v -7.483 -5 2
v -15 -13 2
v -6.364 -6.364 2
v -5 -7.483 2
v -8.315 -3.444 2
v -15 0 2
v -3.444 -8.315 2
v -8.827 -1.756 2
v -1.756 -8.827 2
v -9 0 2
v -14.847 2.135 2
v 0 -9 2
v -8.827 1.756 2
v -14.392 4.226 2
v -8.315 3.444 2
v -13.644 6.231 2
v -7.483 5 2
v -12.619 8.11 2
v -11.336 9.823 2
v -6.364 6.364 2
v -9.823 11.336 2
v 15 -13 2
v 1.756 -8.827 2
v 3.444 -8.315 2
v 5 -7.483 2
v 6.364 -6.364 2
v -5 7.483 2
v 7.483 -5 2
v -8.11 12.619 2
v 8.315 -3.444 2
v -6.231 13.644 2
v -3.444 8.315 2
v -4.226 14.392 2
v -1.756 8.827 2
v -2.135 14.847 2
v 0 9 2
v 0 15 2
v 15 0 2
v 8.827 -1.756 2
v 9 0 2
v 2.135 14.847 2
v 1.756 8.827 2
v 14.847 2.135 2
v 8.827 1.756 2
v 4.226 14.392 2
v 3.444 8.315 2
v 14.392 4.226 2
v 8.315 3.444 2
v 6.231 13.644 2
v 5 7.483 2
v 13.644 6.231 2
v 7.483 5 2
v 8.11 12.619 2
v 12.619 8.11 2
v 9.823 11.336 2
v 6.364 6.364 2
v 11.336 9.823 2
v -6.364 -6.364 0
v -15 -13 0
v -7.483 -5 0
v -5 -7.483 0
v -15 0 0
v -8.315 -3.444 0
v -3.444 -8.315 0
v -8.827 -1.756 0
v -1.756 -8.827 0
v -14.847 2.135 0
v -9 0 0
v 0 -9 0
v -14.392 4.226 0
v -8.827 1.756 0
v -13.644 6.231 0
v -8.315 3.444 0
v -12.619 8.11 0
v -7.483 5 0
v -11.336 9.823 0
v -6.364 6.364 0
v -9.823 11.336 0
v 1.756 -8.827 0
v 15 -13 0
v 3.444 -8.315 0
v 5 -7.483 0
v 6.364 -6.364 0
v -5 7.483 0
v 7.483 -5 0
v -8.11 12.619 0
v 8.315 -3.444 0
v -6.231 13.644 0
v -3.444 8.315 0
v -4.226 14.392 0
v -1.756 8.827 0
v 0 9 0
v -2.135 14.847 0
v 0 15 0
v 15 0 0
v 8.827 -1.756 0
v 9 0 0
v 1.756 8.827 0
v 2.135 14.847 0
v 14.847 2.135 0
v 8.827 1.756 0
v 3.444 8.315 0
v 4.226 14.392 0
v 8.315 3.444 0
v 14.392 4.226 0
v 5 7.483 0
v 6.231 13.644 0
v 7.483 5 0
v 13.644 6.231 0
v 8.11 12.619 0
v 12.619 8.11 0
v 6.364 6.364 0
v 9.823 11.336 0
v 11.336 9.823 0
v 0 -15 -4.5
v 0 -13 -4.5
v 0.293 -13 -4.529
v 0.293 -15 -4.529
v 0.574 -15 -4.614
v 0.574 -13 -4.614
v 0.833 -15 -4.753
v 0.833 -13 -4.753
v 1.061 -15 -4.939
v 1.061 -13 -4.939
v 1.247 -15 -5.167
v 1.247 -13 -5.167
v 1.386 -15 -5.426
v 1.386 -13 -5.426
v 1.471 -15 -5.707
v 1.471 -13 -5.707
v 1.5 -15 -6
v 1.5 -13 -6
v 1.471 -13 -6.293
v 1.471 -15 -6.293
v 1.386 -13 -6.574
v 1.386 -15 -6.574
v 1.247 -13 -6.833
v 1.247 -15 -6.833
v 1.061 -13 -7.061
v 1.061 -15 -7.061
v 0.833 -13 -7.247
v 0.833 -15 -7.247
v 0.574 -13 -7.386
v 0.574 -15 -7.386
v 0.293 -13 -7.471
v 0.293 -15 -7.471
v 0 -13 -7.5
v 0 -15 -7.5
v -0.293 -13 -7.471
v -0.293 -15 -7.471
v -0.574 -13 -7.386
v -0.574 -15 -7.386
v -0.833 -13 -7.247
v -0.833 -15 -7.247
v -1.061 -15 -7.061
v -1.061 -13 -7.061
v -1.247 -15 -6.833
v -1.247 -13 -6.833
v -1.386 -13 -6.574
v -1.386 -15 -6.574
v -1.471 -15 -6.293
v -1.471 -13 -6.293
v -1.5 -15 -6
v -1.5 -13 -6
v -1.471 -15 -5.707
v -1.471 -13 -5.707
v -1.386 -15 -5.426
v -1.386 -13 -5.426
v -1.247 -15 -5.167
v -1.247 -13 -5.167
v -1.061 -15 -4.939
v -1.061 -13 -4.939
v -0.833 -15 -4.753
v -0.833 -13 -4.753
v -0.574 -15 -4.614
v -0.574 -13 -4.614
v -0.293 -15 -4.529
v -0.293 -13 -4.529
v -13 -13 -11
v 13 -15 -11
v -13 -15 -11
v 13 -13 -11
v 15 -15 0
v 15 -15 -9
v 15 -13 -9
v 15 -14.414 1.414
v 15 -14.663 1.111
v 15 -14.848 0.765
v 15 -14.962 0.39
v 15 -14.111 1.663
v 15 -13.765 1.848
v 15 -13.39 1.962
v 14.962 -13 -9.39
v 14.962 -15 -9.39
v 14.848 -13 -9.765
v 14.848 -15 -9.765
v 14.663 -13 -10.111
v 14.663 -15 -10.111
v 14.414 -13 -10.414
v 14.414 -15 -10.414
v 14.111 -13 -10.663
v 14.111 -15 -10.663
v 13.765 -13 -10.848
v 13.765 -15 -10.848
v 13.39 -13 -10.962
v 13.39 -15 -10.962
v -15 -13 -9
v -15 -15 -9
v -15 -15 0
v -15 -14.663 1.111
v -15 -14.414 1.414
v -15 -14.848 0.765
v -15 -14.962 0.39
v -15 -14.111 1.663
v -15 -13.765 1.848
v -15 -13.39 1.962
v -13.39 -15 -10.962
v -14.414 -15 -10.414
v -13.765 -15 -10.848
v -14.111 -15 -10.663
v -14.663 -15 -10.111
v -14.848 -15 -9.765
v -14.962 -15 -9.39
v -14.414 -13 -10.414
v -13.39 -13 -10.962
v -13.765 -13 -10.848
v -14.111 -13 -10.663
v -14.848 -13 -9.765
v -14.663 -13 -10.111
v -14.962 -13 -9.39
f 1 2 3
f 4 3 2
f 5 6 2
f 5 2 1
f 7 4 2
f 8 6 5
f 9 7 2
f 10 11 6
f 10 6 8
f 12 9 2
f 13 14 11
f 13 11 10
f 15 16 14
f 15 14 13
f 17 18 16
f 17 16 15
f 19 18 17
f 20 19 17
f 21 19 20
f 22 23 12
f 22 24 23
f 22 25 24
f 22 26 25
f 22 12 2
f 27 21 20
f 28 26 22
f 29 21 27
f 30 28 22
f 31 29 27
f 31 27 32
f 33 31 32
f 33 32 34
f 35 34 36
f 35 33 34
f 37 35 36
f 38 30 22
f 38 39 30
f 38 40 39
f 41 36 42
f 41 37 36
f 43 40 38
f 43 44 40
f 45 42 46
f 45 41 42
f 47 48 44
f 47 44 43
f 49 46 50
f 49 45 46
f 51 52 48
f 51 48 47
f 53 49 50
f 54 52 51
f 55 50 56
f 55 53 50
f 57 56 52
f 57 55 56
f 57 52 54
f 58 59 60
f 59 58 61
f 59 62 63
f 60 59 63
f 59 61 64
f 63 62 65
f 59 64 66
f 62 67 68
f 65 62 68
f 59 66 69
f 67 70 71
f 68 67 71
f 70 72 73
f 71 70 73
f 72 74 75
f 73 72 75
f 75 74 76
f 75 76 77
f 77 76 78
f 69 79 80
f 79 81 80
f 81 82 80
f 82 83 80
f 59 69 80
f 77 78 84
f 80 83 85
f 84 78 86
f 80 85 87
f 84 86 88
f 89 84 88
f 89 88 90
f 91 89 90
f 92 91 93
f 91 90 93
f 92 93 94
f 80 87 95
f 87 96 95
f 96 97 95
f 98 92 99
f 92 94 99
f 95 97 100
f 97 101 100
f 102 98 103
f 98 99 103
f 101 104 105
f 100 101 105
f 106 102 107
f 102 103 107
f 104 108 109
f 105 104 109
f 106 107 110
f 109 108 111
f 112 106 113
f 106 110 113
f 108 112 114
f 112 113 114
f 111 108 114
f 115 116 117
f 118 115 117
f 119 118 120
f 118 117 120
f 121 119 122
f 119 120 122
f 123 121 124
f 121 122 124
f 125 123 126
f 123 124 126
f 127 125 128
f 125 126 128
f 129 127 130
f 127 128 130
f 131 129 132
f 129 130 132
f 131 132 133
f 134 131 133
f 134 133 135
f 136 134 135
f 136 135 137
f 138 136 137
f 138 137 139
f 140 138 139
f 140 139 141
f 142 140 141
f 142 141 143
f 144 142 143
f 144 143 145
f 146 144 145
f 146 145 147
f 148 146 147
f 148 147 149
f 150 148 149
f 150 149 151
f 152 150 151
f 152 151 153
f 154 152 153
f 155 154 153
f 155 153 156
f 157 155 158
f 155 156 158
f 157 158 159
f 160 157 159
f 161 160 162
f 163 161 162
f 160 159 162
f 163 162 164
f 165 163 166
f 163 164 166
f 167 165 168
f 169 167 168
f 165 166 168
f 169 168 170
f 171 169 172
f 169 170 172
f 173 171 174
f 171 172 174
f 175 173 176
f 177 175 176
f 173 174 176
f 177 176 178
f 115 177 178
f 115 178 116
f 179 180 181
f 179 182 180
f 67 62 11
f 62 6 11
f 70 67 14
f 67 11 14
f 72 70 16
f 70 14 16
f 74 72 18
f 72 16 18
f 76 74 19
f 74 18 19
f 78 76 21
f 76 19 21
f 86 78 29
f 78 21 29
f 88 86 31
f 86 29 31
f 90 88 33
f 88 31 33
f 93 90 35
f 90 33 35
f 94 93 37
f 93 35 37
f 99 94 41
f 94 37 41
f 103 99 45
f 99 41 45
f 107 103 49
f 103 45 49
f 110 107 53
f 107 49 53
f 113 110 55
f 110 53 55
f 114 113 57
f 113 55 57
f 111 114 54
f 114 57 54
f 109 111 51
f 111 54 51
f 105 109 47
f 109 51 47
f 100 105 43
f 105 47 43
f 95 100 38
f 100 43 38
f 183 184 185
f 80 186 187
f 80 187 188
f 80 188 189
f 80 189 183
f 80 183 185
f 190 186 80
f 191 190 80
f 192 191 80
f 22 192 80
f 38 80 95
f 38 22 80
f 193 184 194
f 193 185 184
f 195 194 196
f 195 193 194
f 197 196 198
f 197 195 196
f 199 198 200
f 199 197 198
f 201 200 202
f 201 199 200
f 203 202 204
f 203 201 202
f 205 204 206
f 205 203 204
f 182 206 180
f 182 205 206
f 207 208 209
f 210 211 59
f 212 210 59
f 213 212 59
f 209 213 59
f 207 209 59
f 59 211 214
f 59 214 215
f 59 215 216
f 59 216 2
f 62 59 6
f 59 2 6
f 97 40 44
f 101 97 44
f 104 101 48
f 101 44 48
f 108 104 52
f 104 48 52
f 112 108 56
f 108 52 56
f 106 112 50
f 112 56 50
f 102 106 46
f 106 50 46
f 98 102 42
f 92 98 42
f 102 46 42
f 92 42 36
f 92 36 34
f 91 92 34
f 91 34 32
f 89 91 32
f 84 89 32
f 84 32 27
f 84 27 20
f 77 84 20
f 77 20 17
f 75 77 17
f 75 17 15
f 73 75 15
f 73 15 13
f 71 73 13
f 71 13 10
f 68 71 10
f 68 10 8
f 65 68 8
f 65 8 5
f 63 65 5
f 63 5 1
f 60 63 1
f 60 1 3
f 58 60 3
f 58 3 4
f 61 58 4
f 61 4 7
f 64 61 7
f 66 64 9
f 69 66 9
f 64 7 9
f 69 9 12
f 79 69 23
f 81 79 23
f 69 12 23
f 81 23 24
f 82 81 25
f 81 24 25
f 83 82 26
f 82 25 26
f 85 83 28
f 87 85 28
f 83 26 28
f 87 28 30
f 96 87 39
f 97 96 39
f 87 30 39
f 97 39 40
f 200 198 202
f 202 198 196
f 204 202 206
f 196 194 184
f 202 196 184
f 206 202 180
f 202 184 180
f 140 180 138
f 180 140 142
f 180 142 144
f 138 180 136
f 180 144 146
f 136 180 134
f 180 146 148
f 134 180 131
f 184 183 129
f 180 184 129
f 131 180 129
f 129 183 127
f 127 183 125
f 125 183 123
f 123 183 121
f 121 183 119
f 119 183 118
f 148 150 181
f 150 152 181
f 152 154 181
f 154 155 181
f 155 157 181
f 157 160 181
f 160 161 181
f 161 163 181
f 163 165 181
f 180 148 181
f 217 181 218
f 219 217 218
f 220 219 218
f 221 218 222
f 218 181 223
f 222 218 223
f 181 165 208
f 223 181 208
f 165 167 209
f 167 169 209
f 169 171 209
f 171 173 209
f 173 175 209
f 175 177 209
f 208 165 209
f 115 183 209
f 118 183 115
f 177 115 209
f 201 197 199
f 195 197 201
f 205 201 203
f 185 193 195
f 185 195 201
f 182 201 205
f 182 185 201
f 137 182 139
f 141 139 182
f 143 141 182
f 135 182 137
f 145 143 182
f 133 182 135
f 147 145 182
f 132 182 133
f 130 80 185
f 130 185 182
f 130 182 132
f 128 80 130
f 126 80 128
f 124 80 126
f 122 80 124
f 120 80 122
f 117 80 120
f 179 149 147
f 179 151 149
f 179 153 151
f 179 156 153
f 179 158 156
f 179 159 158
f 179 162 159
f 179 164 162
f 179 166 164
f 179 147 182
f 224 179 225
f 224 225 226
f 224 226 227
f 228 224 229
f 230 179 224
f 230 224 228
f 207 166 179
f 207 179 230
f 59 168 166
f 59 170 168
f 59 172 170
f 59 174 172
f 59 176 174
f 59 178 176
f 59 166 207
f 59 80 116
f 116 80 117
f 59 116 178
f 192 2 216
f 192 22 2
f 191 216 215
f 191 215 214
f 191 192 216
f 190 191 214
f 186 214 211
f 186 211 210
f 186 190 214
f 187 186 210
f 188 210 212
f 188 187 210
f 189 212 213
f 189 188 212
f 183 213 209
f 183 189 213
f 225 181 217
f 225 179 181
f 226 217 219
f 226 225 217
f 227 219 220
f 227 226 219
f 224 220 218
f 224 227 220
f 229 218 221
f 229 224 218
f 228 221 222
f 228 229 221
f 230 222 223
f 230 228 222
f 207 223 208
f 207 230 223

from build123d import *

# Parameters (mm, degrees)
SKETCH1_W           = 30
SKETCH1_H           = 30
BOSS_EXTRUDE1_DEPTH = 2
SKETCH2_R           = 9
CUT_EXTRUDE1_DEPTH  = 22.307275753
FILLET1_R           = 15
SKETCH3_W           = 30
SKETCH3_H           = 2
BOSS_EXTRUDE2_DEPTH = 11
SKETCH4_R           = 1.5
CUT_EXTRUDE2_DEPTH  = 34.615472628
FILLET2_R           = 2


with BuildPart() as part:
    # Sketch1 → Boss-Extrude1 (new body)
    with BuildSketch(Plane.XY):
        Rectangle(SKETCH1_W, SKETCH1_H)
    extrude(amount=BOSS_EXTRUDE1_DEPTH)

    # Sketch2 → Cut-Extrude1 (cut, through all)
    with BuildSketch(Plane.XY.offset(2)):
        Circle(SKETCH2_R)
    extrude(amount=-CUT_EXTRUDE1_DEPTH, mode=Mode.SUBTRACT)

    # Fillet1
    fillet1_edges = [part.edges().sort_by_distance(p)[0] for p in [
        (-15, 15, 1),
        (15, 15, 1),
    ]]
    fillet(fillet1_edges, radius=FILLET1_R - 0.0001)  # a hair under: the kernel refuses the full size

    # Sketch3 → Boss-Extrude2 (add)
    with BuildSketch(Plane(origin=(0, 0, 0), x_dir=(-1, 0, 0), z_dir=(0, 0, -1))):
        with Locations((0, -14)):
            Rectangle(SKETCH3_W, SKETCH3_H)
    extrude(amount=BOSS_EXTRUDE2_DEPTH)

    # Sketch4 → Cut-Extrude2 (cut, through all)
    with BuildSketch(Plane(origin=(0, -13, 0), x_dir=(1, 0, 0), z_dir=(0, 1, 0))):
        with Locations(Location((0, 6, 0), (0, 0, 270))):
            Circle(SKETCH4_R)
    extrude(amount=-CUT_EXTRUDE2_DEPTH, mode=Mode.SUBTRACT)

    # Fillet2
    fillet2_edges = [part.edges().sort_by_distance(p)[0] for p in [
        (15, -14, -11),
        (-15, -14, -11),
        (0, -15, 2),
    ]]
    fillet(fillet2_edges, radius=FILLET2_R)


solid = part.part
